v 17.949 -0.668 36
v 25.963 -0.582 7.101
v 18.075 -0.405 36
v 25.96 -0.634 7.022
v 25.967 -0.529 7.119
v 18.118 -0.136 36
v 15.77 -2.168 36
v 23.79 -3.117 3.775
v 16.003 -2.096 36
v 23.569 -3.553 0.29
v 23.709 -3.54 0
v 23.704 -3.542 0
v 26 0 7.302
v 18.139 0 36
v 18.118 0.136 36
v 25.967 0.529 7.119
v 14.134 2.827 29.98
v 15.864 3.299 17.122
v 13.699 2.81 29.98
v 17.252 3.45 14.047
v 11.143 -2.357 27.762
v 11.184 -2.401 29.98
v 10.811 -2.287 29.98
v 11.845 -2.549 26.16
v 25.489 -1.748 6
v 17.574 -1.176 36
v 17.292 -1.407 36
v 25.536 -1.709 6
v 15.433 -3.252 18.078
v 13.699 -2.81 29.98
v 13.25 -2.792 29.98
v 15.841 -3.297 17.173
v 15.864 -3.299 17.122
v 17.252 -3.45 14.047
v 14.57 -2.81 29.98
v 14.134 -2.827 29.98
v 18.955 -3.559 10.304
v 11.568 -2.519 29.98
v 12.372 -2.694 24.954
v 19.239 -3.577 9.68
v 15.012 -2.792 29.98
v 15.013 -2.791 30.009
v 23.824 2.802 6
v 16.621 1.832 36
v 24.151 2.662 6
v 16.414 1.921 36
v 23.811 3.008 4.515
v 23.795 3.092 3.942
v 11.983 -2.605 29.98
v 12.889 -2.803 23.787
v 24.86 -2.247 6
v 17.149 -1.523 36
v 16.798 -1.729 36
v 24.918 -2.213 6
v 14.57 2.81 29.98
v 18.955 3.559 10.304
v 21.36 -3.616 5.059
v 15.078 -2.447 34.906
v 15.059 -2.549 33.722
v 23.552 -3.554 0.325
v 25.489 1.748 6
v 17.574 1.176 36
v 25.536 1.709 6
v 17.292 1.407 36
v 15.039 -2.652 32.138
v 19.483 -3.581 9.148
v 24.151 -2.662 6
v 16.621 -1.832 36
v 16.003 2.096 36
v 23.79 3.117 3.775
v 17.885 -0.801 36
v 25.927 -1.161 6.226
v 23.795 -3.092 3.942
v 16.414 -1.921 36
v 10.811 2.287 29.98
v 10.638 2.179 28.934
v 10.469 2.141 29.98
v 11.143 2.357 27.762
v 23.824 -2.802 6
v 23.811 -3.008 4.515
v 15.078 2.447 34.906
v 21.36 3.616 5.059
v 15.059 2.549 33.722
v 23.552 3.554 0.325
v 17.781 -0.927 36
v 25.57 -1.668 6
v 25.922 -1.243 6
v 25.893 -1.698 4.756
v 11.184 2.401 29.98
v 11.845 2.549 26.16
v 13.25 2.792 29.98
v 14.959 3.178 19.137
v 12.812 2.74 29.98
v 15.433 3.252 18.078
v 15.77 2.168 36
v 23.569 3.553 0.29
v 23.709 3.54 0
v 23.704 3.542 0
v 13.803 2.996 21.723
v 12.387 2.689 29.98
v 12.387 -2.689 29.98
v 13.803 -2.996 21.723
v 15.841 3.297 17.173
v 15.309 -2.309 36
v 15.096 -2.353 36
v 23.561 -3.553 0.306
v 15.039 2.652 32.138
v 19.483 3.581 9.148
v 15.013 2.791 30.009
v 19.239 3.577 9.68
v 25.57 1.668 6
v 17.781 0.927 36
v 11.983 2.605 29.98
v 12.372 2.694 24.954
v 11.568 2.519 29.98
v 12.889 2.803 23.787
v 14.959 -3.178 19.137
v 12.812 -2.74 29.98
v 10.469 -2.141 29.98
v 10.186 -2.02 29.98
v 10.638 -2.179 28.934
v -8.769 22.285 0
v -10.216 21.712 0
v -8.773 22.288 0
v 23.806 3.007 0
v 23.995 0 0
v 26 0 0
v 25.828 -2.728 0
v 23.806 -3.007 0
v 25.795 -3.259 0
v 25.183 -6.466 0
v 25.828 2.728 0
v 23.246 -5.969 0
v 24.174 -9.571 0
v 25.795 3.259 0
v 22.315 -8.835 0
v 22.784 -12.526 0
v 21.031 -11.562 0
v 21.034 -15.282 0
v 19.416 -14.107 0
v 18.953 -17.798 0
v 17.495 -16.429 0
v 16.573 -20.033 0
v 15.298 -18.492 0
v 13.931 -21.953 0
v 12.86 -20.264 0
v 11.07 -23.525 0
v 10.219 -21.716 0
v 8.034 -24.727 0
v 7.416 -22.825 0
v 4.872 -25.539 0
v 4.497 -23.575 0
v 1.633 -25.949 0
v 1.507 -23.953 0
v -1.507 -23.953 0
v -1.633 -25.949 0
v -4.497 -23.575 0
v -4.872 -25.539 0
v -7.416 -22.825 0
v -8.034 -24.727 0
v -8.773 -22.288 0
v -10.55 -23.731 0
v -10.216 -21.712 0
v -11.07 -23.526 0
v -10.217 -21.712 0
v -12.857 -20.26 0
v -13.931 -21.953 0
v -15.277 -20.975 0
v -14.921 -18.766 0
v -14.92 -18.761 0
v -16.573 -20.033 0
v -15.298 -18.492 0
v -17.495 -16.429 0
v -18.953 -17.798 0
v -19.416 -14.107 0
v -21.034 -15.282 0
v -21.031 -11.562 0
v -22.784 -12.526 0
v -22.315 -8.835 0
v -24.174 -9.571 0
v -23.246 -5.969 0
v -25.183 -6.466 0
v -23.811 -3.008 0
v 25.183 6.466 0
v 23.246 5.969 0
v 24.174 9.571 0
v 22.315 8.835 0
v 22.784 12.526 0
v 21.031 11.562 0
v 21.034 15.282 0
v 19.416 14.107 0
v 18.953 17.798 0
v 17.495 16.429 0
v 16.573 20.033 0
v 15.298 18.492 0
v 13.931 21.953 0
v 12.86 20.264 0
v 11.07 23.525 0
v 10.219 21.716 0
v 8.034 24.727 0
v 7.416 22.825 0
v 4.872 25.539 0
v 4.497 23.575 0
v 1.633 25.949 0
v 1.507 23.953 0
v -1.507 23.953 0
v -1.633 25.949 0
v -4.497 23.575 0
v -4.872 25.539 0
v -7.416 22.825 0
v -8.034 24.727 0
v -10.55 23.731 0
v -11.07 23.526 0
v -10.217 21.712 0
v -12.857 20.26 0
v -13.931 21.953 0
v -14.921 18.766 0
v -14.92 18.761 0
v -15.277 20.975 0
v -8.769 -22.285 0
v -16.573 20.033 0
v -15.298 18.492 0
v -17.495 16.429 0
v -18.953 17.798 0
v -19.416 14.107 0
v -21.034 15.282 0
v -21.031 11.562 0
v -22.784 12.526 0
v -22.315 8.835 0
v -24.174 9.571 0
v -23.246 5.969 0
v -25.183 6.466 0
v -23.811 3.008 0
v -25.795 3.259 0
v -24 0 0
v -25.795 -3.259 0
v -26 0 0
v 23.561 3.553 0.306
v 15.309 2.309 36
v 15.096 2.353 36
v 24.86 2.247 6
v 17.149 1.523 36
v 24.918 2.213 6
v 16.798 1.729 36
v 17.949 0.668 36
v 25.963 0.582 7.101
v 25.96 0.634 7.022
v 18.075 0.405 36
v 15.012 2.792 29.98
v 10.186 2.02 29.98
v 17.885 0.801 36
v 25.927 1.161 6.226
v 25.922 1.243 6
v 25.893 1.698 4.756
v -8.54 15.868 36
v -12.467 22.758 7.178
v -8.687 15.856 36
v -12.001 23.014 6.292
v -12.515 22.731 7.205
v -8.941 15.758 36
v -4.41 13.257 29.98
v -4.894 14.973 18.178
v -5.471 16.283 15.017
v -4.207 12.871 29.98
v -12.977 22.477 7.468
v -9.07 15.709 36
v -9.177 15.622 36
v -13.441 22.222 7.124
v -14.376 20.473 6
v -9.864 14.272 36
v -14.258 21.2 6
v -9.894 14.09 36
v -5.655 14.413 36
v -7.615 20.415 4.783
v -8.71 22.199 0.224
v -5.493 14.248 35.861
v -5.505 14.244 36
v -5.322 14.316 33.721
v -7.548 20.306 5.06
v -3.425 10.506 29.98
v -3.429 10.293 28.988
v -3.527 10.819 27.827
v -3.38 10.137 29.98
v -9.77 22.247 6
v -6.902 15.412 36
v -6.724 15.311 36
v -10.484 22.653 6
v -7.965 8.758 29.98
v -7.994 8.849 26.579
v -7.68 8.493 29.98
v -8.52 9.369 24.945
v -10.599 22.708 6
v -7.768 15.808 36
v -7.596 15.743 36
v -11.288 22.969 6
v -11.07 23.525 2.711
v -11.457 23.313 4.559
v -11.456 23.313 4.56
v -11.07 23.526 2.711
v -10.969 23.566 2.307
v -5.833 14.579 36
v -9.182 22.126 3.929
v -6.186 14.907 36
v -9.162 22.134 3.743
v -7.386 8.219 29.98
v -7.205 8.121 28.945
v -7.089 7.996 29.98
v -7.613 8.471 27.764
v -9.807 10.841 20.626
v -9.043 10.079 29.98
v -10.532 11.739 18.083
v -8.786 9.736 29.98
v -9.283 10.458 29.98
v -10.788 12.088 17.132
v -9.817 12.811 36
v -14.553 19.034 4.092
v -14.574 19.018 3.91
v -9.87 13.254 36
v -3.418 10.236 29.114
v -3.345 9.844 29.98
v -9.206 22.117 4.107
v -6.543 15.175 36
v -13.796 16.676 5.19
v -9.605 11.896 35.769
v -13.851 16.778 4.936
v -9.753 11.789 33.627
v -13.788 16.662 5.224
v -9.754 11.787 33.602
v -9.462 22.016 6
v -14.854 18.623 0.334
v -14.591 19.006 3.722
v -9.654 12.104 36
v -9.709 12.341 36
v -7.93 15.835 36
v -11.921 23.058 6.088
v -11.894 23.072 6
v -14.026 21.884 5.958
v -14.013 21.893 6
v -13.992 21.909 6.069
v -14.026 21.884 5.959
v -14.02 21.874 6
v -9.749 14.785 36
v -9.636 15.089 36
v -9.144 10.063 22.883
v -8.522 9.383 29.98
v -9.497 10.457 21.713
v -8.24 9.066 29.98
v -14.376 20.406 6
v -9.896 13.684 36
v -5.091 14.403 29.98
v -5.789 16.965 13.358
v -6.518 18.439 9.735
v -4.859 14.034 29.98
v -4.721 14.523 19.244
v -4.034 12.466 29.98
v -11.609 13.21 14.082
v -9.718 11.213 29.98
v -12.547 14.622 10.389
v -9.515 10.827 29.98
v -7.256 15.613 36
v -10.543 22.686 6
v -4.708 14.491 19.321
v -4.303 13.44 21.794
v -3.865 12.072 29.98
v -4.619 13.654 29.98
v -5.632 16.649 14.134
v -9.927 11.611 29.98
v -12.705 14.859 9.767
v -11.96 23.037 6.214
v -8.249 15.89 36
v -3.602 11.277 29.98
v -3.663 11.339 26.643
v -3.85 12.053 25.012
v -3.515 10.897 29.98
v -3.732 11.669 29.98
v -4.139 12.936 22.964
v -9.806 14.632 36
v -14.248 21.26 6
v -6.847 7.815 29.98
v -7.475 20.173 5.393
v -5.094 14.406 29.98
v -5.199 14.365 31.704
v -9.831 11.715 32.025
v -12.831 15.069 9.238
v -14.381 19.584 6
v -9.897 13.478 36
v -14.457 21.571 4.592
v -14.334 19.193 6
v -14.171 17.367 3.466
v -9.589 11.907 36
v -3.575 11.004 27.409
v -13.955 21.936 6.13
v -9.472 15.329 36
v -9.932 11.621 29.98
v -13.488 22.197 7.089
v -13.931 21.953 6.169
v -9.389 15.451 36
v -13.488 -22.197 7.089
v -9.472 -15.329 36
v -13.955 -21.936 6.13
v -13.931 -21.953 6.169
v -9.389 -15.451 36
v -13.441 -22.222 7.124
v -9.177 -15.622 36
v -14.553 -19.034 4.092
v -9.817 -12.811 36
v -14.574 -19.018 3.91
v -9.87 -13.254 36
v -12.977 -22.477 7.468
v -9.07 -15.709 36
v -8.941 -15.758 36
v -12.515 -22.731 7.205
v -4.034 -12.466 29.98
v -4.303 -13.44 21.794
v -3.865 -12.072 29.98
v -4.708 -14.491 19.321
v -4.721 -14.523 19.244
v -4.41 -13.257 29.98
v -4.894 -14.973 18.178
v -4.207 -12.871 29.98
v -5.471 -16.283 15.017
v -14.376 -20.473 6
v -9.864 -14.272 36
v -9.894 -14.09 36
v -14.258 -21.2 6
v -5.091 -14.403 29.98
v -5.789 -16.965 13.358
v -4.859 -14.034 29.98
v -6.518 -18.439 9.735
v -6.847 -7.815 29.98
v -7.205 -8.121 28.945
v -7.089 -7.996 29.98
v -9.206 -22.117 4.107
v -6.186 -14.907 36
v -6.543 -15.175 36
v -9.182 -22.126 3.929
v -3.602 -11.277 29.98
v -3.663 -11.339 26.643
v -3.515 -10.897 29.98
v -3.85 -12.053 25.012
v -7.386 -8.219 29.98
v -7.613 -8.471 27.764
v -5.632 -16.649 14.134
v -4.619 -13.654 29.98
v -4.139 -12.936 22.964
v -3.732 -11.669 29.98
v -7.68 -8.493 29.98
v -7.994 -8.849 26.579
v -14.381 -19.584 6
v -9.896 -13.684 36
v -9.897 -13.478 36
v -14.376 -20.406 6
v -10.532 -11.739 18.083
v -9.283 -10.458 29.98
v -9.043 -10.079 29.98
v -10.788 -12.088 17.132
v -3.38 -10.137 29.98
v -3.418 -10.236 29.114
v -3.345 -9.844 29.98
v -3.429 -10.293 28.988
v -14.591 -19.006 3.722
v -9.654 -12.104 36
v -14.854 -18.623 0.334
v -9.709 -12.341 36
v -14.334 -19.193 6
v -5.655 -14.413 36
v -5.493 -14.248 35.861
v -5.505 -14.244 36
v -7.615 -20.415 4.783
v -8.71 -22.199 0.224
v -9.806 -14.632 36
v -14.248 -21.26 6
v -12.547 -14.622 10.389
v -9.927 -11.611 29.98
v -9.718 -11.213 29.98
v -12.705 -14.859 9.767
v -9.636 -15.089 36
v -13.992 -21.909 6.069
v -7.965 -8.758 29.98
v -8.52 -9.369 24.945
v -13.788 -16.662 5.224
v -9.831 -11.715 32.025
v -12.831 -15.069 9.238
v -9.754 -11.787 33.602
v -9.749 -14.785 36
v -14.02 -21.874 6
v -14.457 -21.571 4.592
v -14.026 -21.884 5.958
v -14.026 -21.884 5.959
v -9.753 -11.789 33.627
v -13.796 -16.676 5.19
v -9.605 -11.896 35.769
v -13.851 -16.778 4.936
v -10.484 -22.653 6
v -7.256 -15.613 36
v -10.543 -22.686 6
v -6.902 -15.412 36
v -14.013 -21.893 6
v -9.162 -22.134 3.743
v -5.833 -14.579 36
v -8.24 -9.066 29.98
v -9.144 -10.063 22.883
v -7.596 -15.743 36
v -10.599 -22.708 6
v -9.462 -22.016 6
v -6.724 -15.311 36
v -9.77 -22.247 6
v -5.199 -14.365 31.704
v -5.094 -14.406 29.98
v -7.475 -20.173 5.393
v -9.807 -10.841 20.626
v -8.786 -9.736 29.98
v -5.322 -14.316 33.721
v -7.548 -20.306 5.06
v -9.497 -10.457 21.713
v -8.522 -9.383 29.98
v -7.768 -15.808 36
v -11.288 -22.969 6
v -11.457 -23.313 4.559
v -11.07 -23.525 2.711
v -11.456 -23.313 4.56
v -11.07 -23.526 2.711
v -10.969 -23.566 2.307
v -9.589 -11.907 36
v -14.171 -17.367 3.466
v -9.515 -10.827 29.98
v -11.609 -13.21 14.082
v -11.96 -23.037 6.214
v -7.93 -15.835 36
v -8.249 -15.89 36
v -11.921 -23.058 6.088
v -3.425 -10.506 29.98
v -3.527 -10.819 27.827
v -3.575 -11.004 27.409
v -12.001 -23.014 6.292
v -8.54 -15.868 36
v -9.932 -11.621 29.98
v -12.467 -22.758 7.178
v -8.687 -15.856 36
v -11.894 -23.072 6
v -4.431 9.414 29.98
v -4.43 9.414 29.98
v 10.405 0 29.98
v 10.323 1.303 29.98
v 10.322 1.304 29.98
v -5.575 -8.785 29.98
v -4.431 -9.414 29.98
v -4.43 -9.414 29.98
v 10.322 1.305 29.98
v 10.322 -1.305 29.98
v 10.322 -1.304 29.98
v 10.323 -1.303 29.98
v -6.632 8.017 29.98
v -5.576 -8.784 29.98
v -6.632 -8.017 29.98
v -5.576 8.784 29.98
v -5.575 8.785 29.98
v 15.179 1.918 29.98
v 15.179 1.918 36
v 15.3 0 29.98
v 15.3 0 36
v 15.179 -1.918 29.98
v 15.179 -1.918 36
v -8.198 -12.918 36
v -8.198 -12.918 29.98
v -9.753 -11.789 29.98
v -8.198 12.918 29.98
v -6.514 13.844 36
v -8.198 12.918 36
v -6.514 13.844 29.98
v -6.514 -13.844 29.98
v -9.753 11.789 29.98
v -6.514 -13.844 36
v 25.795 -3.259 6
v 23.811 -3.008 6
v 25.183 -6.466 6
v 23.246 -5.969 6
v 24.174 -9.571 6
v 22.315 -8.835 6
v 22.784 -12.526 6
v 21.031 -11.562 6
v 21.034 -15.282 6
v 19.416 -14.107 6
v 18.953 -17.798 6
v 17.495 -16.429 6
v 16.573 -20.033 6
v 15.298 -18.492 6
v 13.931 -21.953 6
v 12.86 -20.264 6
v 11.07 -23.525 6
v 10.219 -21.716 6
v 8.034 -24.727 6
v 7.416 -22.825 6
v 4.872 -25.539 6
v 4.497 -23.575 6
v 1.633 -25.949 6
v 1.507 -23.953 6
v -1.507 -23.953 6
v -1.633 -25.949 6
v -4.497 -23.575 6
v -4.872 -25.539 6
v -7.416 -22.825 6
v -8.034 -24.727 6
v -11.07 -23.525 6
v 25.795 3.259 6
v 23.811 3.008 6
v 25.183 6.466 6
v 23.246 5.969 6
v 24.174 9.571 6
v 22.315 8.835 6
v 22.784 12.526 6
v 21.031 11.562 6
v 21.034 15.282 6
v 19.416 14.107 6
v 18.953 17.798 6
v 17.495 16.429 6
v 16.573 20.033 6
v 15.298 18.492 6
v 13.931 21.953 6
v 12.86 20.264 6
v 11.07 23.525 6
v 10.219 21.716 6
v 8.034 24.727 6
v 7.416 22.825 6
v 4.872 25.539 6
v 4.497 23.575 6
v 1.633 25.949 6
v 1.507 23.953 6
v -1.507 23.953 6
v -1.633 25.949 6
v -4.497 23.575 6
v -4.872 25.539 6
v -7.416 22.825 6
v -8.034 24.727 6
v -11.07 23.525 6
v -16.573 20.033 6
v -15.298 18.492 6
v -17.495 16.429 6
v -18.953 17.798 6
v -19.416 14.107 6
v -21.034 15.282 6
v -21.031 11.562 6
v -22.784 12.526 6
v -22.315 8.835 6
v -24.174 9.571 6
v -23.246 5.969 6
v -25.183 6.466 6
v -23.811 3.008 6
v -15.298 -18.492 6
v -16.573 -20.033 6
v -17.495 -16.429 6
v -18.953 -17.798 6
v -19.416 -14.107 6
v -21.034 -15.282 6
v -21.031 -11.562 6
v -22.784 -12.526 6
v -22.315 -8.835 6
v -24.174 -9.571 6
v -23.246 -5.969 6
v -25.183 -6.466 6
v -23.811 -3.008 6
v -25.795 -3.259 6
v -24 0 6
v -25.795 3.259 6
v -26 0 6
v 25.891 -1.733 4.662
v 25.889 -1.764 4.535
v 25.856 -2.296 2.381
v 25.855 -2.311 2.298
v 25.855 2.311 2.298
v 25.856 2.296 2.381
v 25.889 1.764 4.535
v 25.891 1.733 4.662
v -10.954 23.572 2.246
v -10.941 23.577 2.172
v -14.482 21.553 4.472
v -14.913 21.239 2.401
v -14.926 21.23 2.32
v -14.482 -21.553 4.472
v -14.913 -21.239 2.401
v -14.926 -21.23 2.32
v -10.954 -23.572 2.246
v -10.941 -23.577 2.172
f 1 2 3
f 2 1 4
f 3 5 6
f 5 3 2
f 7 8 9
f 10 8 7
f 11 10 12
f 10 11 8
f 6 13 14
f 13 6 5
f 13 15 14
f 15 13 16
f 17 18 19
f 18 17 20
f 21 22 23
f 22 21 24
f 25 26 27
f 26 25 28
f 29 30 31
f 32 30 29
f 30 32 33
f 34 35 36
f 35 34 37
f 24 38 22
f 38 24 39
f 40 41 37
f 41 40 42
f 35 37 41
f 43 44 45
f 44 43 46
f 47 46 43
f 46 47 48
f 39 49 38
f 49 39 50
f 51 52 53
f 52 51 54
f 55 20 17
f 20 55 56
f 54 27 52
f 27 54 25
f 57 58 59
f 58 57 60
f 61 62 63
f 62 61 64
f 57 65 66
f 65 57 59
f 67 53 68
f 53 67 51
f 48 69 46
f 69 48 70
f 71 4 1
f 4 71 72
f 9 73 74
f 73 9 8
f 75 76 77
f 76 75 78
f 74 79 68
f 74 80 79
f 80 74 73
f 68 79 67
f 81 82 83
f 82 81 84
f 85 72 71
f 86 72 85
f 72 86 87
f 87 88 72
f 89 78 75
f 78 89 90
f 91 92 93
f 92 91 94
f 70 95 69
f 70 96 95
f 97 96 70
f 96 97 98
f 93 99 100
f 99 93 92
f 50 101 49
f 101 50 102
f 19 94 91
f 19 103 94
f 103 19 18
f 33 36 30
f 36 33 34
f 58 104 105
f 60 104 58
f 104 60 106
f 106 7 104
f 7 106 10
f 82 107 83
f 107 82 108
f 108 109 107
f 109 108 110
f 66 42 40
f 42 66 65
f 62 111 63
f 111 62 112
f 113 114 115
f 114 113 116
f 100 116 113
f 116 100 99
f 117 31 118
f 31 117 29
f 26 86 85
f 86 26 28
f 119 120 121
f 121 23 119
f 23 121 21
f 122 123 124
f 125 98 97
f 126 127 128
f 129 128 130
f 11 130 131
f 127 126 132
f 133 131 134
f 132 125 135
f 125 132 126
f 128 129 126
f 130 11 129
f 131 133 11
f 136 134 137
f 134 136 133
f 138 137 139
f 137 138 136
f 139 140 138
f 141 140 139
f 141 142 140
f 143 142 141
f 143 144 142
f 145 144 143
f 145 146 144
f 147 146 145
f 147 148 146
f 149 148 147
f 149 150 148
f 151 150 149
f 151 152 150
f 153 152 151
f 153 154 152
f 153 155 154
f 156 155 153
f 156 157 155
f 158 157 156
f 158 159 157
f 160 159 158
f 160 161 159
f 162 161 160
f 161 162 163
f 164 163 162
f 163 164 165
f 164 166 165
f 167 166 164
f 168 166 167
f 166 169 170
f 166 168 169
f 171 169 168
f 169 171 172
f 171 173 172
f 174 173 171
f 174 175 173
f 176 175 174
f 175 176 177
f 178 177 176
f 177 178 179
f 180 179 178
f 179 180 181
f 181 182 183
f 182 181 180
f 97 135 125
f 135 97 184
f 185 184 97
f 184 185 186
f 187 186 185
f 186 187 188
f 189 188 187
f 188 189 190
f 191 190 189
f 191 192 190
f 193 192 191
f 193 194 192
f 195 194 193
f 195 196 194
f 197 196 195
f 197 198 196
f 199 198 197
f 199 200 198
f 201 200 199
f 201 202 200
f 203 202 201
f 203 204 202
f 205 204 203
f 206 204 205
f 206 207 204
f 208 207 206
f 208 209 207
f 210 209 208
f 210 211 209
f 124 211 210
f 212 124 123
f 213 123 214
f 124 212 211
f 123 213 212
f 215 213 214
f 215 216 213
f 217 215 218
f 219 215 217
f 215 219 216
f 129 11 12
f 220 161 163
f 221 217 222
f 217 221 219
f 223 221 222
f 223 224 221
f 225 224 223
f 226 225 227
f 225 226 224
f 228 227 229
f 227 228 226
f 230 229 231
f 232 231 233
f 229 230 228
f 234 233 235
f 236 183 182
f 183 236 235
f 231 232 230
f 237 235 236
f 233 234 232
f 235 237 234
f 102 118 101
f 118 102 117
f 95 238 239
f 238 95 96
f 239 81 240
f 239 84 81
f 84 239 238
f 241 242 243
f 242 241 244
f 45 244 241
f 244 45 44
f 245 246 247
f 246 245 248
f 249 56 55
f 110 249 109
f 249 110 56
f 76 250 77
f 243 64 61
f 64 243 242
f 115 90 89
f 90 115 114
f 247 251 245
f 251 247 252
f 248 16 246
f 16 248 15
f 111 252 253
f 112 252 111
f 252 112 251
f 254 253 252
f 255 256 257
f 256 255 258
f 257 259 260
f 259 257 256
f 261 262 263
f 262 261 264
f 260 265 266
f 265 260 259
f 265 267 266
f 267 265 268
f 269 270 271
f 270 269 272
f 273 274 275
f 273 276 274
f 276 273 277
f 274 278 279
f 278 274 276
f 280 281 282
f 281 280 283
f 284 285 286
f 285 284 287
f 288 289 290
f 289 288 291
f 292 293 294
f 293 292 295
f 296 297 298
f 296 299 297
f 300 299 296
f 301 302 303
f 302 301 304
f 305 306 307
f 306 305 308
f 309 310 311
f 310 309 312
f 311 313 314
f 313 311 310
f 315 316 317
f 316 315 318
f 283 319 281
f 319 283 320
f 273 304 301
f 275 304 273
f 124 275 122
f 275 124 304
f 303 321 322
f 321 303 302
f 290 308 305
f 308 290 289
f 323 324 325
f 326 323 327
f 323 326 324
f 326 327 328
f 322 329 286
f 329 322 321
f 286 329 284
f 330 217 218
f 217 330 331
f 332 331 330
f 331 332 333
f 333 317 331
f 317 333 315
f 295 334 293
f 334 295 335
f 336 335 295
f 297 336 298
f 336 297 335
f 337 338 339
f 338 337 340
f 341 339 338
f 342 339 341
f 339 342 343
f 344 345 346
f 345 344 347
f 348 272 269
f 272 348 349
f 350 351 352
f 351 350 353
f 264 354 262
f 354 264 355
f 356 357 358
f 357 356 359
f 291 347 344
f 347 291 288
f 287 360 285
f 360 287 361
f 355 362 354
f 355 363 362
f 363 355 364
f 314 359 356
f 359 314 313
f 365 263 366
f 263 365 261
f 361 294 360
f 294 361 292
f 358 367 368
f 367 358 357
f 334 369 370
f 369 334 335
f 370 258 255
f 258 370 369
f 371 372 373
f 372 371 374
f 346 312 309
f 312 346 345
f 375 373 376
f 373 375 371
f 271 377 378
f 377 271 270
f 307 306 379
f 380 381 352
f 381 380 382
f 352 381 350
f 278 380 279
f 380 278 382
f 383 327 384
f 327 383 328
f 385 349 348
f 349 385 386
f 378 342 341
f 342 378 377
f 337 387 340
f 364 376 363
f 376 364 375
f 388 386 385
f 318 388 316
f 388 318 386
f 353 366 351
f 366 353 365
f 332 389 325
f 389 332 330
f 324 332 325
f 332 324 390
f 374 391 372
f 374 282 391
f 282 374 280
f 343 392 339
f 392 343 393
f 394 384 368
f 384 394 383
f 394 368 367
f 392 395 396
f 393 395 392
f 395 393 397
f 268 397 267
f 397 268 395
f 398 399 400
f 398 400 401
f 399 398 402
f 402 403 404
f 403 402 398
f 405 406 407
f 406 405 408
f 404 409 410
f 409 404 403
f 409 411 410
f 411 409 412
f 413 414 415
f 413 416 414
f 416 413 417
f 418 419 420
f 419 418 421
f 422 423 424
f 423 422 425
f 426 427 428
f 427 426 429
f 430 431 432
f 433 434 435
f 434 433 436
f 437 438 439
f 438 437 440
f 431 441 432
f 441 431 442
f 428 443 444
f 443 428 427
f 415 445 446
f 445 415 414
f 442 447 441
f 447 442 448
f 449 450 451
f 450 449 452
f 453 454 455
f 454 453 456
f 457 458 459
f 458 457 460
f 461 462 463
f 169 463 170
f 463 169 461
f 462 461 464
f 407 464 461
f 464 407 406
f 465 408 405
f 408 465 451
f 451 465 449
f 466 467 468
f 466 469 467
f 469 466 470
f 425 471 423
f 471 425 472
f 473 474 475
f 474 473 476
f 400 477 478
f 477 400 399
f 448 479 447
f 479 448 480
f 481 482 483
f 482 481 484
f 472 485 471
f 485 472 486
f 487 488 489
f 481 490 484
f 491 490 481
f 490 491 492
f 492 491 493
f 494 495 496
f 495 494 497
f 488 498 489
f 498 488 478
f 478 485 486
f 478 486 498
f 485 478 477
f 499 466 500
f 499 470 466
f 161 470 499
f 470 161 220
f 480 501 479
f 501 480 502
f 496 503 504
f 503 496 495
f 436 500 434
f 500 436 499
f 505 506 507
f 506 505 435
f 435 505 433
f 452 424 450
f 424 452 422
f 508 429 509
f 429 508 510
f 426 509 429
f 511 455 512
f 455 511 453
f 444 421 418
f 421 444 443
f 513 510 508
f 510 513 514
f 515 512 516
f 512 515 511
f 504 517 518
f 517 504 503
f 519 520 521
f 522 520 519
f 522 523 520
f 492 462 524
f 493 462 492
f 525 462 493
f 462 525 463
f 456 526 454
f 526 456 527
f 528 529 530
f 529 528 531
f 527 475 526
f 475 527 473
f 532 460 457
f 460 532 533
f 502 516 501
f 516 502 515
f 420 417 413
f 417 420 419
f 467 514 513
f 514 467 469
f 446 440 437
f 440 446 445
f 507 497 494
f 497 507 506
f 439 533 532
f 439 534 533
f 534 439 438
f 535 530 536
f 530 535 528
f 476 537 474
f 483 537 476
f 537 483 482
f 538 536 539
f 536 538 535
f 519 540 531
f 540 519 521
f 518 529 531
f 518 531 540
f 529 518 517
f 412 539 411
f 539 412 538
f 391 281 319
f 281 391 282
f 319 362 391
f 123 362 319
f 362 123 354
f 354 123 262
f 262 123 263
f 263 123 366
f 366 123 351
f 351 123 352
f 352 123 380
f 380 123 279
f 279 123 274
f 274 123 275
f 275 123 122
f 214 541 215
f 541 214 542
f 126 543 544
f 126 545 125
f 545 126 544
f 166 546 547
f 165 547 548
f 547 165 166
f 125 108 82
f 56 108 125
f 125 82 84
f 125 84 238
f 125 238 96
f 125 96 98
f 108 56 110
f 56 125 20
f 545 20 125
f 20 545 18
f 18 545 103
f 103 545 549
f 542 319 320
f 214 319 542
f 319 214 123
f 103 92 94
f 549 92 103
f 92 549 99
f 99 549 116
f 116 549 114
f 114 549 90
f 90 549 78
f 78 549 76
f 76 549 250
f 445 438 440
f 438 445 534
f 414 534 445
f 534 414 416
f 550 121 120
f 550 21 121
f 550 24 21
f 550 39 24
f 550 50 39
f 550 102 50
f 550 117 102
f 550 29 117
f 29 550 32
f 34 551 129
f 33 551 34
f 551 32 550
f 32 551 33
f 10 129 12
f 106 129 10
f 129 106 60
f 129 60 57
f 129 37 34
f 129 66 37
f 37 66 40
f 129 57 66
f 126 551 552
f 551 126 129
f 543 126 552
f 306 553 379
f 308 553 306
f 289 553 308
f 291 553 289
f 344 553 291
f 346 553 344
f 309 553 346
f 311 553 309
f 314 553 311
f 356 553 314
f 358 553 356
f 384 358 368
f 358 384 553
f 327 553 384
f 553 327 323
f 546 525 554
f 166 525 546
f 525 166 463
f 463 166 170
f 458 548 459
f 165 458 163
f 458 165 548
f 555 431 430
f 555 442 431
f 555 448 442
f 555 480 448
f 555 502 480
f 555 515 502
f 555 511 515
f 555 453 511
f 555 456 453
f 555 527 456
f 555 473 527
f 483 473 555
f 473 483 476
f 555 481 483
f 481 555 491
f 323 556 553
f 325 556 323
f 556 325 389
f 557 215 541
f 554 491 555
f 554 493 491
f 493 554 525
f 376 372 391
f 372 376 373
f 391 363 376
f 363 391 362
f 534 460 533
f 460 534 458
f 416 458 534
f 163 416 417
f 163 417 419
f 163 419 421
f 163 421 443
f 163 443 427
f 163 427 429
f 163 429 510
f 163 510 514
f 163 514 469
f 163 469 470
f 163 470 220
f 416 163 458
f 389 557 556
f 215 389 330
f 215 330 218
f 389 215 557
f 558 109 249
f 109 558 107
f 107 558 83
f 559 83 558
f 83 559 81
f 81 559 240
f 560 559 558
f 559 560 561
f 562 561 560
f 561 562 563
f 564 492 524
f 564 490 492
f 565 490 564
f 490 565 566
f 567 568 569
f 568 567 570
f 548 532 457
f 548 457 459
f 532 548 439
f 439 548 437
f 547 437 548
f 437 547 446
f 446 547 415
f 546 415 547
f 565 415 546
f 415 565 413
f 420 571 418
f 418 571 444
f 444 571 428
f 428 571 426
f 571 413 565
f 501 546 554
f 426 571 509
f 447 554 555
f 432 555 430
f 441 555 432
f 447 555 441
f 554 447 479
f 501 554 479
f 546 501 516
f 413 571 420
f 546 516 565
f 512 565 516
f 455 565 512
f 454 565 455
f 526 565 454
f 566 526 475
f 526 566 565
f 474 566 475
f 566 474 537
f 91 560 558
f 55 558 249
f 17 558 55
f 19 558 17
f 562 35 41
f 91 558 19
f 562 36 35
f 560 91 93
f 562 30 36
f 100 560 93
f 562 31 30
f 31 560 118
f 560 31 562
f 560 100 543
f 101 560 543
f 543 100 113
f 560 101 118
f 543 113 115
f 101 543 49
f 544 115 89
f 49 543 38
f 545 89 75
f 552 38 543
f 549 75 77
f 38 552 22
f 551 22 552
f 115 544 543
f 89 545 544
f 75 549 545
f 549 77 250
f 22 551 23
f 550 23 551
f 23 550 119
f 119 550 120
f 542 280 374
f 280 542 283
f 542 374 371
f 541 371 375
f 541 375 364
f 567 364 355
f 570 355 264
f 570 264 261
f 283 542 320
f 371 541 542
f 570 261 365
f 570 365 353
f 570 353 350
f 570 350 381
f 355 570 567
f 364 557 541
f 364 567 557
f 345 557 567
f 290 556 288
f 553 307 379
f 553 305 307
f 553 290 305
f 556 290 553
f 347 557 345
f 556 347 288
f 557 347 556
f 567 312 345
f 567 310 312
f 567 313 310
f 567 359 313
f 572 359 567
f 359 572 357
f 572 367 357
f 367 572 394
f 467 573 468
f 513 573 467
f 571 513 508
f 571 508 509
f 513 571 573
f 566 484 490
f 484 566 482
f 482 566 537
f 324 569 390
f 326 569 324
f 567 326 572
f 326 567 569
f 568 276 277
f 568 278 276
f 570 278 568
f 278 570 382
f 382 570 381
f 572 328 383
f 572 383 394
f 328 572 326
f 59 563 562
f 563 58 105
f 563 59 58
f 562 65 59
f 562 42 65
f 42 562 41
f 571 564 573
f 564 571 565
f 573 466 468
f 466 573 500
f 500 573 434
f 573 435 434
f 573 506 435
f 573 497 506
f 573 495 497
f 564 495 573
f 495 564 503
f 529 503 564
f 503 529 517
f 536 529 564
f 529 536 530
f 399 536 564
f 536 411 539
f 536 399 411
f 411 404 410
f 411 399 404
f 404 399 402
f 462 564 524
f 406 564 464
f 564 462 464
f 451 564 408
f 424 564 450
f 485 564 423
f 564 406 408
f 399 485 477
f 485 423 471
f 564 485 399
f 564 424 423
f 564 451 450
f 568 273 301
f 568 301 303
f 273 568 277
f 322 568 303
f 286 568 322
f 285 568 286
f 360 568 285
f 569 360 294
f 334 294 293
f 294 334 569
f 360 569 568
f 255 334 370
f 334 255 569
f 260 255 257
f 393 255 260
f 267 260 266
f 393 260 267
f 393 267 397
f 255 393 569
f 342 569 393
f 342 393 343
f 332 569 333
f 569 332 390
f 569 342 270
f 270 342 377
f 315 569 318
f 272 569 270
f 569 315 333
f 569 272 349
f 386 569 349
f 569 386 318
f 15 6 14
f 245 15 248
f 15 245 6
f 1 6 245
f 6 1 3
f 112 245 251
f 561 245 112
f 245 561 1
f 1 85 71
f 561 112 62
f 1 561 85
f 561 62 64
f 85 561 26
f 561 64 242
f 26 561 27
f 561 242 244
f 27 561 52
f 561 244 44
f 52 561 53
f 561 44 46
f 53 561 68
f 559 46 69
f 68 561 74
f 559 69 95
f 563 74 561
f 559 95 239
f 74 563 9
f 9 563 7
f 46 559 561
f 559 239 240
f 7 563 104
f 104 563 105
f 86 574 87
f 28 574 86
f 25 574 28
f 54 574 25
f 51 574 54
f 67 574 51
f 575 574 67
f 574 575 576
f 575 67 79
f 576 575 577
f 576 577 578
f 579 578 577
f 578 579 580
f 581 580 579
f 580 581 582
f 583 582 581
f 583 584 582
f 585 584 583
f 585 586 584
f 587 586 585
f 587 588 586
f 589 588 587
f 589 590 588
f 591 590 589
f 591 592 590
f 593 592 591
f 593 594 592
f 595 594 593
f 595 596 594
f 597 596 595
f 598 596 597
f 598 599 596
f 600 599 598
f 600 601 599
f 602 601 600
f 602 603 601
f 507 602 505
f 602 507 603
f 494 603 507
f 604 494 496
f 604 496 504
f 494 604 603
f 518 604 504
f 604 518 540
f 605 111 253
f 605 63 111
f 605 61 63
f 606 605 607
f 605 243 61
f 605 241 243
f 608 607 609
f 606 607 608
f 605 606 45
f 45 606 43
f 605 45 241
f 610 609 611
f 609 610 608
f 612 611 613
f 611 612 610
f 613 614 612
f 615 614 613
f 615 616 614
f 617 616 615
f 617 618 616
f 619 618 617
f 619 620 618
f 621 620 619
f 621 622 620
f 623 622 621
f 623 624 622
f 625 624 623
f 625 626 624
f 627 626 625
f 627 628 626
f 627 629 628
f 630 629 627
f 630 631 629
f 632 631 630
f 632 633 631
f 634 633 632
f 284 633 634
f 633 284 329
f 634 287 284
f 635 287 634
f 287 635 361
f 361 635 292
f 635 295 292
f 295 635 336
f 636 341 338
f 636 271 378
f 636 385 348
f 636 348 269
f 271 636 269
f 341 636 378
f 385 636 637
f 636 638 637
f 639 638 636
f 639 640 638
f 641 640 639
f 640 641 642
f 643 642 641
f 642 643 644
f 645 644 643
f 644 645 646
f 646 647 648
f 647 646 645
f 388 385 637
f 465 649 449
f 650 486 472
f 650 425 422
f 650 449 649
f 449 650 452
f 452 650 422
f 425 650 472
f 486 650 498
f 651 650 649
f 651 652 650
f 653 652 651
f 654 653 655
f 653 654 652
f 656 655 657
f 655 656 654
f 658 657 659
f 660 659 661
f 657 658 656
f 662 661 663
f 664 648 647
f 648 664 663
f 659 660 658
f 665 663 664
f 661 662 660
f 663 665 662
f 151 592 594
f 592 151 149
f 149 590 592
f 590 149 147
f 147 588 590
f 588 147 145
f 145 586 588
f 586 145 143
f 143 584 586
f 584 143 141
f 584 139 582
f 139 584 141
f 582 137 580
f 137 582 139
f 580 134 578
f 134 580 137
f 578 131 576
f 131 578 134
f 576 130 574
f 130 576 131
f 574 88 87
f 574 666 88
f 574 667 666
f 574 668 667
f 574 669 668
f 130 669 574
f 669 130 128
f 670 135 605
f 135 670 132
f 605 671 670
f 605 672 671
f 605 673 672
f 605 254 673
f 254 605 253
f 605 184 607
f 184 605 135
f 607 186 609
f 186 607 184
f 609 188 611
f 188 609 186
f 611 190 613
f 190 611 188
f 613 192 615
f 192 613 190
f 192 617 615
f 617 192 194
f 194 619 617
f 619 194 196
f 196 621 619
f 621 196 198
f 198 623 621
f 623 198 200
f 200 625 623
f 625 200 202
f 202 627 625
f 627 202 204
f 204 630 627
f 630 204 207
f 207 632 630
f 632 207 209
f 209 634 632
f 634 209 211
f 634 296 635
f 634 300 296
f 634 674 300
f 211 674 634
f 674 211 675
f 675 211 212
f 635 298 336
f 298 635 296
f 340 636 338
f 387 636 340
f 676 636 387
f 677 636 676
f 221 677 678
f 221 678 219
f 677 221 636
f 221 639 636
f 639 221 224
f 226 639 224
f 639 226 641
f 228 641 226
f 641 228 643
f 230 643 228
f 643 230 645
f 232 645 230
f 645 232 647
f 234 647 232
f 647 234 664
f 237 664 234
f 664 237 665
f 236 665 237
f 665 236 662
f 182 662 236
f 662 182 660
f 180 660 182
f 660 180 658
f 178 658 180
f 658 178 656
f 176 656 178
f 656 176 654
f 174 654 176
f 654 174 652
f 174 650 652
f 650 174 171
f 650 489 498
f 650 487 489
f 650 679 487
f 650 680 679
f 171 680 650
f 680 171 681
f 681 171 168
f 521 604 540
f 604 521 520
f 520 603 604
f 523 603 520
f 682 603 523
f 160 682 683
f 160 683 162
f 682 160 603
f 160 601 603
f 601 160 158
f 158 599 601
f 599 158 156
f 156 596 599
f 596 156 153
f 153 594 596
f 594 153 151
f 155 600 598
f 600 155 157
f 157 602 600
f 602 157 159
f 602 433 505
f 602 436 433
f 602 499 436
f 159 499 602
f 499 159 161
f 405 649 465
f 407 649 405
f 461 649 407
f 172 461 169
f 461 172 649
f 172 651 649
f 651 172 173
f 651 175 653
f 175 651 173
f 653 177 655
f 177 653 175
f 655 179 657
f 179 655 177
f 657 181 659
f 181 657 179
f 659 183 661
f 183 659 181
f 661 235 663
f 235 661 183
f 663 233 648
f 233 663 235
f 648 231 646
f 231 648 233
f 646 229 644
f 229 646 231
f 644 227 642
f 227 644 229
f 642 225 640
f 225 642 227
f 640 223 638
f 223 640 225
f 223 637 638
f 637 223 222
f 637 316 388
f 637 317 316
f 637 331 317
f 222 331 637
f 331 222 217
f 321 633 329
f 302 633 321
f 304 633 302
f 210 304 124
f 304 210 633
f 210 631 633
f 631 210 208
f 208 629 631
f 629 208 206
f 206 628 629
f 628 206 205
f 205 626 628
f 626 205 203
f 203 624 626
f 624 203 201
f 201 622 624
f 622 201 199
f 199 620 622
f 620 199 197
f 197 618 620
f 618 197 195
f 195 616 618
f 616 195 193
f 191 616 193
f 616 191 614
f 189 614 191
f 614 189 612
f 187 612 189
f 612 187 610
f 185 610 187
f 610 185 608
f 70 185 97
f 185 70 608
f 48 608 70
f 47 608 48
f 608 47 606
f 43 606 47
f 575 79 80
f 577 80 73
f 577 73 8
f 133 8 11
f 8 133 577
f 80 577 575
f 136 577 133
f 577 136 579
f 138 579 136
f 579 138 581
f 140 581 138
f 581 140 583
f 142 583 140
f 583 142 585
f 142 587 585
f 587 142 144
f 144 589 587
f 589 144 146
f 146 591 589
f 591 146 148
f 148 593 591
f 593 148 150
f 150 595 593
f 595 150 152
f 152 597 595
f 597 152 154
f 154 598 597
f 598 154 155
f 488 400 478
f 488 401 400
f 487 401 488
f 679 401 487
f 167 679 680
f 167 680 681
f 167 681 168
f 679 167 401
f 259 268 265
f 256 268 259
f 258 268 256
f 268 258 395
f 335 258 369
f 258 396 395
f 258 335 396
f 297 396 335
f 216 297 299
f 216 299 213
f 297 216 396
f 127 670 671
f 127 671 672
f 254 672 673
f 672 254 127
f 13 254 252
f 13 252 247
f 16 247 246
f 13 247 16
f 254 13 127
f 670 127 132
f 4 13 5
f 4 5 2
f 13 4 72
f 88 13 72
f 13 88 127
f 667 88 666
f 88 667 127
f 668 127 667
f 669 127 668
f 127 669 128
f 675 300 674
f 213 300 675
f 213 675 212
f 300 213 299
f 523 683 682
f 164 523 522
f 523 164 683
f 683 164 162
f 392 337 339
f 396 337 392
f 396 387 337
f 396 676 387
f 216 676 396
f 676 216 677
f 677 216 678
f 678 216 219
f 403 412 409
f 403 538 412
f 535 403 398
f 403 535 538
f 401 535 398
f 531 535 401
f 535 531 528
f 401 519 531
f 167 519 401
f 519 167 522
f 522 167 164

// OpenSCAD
od=27;
id=20.8;
nozzle_dia=8;
twist=0;
poles=3;
th=48;
add_nozzle=twist>0;
bottom_ring=!twist;
guide_holes=bottom_ring&&0;
zr=360/poles;
*nozzle();
mirror([0,0,bottom_ring==0?1:0])
{
difference() {
  union() {
    if(bottom_ring&&guide_holes)
    for(r=[zr/(twist>0?4:2):zr:360]) rotate([0,0,r]) translate([25,0]) cylinder(d=8.6,h=10,$fn=40);
mirror([0,0,0]) intersection() {
  cylinder(r=26,h=th,$fn=50);
  union() {
    if(bottom_ring)
    linear_extrude(6,convexity=10) { difference() { circle(r=26,$fn=50); circle(r=24,$fn=50); } }
    difference() {
      union() {
        for(r=[0:zr:359]) rotate([0,0,r]) linear_extrude(th-2, convexity=10, twist=twist, scale=.55) {
          translate([20,0]) scale([2,1]) circle(d=8,$fn=40);
        }
      }
      translate([0,0,-.01]) cylinder(d=id,h=th+10,$fn=50);
      translate([0,0,-.01]) cylinder(r1=bottom_ring?24:18,d2=add_nozzle?od:id,h=th-18,$fn=50);
      *translate([0,0,th-18]) cylinder(d=od,h=6.1,$fn=50);
      translate([0,0,th-18.02]) cylinder(d=od+3.6,h=16.1,$fn=50);
      if(!add_nozzle)
        translate([0,0,th-12]) cylinder(d=od+10,h=10,$fn=50);
      *translate([0,0,30]) nozzle();
    }
    if(add_nozzle)
    translate([0,0,30]) nozzle();
  }
}
}
  if(guide_holes)
    for(r=[zr/(twist>0?4:2):zr:360]) rotate([0,0,r]) translate([25,0,-.1]) cylinder(d=5,h=10.2,$fn=40);
    }
*difference() {
  cylinder(d=od,h=50,$fn=60);
  translate([0,0,3]) cylinder(d=id,h=50,$fn=50);
}
}
module nozzle() {
  translate([0,0,16]) difference() {
    union() {
      translate([0,0,-16]) cylinder(d=od+3.6,h=36,$fn=50);
      *translate([0,0,20]) cylinder(d1=od+3.6,d2=od,h=4,$fn=50);
    }
    translate([0,0,-.01]) cylinder(d=nozzle_dia,h=10.02,$fn=30);
    translate([0,0,2]) cylinder(d1=nozzle_dia,d2=id,h=4,$fn=50);
    translate([0,0,5.99]) cylinder(d=od+.4,h=20,$fn=50);
    translate([0,0,od*-.7]) scale([1,1,1.5]) sphere(d=od,$fn=50);
  }
}
